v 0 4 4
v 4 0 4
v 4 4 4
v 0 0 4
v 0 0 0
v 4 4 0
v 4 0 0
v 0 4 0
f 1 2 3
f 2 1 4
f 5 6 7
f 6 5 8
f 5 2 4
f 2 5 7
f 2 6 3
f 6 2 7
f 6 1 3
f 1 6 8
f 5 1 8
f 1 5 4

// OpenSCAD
union() {
  translate([0, 0, 0]) cube(size=[4,4,4], center=false);
}
